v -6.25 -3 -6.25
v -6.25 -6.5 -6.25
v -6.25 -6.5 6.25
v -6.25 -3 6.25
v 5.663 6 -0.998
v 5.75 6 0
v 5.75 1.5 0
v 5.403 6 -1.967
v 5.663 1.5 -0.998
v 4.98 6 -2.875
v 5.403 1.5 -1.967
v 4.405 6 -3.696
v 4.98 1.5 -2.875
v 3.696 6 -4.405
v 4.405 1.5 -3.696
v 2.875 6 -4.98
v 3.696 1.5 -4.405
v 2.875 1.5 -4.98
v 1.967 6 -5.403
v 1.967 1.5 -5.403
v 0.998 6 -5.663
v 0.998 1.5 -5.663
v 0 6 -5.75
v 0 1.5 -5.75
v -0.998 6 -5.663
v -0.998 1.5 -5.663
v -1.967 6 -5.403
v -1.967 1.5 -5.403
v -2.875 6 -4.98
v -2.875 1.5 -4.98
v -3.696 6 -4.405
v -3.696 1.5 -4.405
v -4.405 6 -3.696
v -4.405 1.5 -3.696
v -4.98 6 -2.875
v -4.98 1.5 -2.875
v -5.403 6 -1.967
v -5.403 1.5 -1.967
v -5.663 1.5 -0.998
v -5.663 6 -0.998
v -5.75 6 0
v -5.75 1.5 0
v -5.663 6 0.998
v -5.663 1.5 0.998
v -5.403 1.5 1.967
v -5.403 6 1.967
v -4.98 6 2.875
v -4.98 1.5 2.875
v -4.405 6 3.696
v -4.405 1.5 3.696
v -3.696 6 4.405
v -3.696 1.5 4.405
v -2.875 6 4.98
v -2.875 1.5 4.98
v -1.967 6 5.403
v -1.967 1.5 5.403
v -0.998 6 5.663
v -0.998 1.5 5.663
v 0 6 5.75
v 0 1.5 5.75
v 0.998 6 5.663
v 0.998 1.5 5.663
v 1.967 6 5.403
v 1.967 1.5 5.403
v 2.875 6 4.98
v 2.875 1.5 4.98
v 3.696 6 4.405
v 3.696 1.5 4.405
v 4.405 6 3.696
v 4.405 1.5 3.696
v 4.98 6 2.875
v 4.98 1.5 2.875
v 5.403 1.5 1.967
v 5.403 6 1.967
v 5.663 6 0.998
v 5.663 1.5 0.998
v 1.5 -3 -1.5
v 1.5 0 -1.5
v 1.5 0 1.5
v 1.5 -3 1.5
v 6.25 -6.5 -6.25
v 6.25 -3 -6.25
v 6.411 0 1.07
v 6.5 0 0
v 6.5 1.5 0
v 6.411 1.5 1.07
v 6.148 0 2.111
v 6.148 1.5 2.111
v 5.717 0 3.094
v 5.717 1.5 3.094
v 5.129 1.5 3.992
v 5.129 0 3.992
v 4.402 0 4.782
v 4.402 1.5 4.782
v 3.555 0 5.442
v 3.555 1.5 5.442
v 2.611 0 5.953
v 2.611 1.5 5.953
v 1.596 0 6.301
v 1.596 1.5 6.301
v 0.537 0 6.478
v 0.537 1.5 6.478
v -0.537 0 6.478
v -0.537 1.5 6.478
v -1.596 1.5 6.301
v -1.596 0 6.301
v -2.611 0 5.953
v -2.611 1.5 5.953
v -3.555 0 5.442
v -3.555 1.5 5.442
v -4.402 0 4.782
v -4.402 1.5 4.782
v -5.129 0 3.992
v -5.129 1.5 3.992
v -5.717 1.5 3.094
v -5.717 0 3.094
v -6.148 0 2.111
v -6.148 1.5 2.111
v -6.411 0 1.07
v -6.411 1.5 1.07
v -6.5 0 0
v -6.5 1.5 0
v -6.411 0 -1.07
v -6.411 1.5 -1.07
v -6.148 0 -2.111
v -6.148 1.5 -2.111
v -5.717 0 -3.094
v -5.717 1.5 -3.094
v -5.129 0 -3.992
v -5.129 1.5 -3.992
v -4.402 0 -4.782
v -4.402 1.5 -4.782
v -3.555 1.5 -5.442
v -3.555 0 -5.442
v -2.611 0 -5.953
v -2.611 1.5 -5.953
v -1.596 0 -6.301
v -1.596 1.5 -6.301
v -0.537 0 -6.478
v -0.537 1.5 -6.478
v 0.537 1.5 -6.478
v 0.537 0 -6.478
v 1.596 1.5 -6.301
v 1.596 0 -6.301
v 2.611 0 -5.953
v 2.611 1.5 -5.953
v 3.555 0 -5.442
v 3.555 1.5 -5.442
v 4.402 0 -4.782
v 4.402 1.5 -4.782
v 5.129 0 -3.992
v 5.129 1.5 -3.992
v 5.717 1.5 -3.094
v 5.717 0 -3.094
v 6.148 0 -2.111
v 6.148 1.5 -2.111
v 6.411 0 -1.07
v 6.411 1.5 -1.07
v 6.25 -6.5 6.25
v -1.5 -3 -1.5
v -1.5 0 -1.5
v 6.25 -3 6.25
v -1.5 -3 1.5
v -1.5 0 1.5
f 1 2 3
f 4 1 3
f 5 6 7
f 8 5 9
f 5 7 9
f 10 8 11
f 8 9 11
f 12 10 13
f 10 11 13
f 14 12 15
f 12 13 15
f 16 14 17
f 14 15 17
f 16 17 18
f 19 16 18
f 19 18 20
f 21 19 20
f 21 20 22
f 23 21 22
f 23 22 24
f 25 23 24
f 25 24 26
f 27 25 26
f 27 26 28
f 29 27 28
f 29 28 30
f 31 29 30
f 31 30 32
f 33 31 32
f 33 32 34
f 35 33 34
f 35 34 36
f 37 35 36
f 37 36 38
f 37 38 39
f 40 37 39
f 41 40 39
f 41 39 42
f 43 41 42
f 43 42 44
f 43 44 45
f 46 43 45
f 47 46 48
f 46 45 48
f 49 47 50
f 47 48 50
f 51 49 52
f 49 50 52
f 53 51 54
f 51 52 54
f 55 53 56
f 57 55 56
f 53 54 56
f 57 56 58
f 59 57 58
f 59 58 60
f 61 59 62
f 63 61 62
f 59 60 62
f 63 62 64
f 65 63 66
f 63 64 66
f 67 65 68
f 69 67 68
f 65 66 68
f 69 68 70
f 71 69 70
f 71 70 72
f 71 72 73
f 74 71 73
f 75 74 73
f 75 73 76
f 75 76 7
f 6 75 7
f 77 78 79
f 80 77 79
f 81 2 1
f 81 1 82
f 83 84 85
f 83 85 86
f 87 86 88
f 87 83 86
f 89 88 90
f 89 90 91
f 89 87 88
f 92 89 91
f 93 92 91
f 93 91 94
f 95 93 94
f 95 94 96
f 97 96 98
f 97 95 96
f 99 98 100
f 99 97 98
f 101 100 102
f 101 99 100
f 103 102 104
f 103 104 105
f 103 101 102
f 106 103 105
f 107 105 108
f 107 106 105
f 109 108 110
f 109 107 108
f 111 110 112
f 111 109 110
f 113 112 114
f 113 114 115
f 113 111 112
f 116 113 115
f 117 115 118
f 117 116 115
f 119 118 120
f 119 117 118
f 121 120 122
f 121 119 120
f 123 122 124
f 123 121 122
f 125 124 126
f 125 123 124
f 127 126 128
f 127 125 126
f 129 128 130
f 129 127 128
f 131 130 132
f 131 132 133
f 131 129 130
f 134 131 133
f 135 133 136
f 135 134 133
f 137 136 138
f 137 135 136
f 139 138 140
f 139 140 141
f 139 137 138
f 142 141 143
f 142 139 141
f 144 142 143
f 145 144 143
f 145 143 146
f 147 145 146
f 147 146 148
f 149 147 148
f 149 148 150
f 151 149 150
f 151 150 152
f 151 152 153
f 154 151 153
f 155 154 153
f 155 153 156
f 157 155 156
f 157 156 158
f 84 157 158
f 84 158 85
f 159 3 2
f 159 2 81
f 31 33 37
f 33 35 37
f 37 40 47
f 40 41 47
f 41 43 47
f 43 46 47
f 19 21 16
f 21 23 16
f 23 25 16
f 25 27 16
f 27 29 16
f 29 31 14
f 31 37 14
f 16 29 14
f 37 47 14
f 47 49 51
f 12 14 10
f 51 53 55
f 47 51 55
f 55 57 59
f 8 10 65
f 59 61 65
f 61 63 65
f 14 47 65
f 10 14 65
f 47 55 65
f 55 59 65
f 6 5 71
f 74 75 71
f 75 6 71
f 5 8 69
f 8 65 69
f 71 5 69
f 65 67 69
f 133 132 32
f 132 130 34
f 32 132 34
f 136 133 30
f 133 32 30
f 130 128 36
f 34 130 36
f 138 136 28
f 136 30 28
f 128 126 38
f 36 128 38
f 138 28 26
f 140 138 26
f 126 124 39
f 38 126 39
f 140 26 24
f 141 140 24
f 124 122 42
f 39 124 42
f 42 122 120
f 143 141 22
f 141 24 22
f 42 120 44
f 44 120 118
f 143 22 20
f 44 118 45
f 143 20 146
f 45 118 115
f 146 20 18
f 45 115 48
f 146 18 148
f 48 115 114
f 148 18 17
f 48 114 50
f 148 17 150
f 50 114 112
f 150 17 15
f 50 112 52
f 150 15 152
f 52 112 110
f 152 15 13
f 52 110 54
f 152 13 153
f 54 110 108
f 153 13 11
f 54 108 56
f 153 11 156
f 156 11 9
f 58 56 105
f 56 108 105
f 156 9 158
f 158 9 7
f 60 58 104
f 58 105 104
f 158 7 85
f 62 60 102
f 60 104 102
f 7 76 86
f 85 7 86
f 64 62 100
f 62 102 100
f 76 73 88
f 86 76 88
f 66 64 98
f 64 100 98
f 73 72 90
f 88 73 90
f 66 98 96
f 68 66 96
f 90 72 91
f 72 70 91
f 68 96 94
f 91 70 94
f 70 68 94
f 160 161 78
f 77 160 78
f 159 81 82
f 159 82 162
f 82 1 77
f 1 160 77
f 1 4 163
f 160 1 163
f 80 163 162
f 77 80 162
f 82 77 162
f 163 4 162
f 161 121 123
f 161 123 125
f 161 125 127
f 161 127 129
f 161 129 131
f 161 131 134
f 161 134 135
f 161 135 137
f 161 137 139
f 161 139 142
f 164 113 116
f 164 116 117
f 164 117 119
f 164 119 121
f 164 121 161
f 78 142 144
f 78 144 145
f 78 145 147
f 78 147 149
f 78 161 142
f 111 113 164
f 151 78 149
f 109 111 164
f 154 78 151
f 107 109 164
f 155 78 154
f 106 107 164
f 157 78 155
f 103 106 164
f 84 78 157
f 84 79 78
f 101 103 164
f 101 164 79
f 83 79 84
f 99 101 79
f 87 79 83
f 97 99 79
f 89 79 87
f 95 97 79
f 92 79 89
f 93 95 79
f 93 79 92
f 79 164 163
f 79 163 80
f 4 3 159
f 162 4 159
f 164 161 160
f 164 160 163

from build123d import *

# Parameters (mm, degrees)
SKETCH_1_R      = 5.75
EXTRUDE_1_DEPTH = 6
SKETCH_2_R      = 6.5
EXTRUDE_2_DEPTH = 1.5
EXTRUDE_START   = -6
SKETCH_3_W      = 3
SKETCH_3_H      = 3
EXTRUDE_3_DEPTH = 12.5
SKETCH_4_W      = 12.5
SKETCH_4_H      = 12.5
EXTRUDE_4_DEPTH = 3.5


with BuildPart() as part:
    # Эскиз1 → Бобышка-Вытянуть1 (new body)
    with BuildSketch(Plane(origin=(0, 0, 0), x_dir=(1, 0, 0), z_dir=(0, 1, 0))):
        Circle(SKETCH_1_R)
    extrude(amount=EXTRUDE_1_DEPTH)

    # Эскиз2 → Бобышка-Вытянуть2 (add)
    with BuildSketch(Plane.XZ):
        Circle(SKETCH_2_R)
    extrude(amount=-EXTRUDE_2_DEPTH)

    # Эскиз3 → Бобышка-Вытянуть3 (add)
    with BuildSketch(Plane.XZ.offset(EXTRUDE_START)):
        Rectangle(SKETCH_3_W, SKETCH_3_H)
    extrude(amount=EXTRUDE_3_DEPTH)

    # Эскиз4 → Бобышка-Вытянуть4 (add)
    with BuildSketch(Plane.XZ.offset(6.5)):
        Rectangle(SKETCH_4_W, SKETCH_4_H)
    extrude(amount=-EXTRUDE_4_DEPTH)


solid = part.part
